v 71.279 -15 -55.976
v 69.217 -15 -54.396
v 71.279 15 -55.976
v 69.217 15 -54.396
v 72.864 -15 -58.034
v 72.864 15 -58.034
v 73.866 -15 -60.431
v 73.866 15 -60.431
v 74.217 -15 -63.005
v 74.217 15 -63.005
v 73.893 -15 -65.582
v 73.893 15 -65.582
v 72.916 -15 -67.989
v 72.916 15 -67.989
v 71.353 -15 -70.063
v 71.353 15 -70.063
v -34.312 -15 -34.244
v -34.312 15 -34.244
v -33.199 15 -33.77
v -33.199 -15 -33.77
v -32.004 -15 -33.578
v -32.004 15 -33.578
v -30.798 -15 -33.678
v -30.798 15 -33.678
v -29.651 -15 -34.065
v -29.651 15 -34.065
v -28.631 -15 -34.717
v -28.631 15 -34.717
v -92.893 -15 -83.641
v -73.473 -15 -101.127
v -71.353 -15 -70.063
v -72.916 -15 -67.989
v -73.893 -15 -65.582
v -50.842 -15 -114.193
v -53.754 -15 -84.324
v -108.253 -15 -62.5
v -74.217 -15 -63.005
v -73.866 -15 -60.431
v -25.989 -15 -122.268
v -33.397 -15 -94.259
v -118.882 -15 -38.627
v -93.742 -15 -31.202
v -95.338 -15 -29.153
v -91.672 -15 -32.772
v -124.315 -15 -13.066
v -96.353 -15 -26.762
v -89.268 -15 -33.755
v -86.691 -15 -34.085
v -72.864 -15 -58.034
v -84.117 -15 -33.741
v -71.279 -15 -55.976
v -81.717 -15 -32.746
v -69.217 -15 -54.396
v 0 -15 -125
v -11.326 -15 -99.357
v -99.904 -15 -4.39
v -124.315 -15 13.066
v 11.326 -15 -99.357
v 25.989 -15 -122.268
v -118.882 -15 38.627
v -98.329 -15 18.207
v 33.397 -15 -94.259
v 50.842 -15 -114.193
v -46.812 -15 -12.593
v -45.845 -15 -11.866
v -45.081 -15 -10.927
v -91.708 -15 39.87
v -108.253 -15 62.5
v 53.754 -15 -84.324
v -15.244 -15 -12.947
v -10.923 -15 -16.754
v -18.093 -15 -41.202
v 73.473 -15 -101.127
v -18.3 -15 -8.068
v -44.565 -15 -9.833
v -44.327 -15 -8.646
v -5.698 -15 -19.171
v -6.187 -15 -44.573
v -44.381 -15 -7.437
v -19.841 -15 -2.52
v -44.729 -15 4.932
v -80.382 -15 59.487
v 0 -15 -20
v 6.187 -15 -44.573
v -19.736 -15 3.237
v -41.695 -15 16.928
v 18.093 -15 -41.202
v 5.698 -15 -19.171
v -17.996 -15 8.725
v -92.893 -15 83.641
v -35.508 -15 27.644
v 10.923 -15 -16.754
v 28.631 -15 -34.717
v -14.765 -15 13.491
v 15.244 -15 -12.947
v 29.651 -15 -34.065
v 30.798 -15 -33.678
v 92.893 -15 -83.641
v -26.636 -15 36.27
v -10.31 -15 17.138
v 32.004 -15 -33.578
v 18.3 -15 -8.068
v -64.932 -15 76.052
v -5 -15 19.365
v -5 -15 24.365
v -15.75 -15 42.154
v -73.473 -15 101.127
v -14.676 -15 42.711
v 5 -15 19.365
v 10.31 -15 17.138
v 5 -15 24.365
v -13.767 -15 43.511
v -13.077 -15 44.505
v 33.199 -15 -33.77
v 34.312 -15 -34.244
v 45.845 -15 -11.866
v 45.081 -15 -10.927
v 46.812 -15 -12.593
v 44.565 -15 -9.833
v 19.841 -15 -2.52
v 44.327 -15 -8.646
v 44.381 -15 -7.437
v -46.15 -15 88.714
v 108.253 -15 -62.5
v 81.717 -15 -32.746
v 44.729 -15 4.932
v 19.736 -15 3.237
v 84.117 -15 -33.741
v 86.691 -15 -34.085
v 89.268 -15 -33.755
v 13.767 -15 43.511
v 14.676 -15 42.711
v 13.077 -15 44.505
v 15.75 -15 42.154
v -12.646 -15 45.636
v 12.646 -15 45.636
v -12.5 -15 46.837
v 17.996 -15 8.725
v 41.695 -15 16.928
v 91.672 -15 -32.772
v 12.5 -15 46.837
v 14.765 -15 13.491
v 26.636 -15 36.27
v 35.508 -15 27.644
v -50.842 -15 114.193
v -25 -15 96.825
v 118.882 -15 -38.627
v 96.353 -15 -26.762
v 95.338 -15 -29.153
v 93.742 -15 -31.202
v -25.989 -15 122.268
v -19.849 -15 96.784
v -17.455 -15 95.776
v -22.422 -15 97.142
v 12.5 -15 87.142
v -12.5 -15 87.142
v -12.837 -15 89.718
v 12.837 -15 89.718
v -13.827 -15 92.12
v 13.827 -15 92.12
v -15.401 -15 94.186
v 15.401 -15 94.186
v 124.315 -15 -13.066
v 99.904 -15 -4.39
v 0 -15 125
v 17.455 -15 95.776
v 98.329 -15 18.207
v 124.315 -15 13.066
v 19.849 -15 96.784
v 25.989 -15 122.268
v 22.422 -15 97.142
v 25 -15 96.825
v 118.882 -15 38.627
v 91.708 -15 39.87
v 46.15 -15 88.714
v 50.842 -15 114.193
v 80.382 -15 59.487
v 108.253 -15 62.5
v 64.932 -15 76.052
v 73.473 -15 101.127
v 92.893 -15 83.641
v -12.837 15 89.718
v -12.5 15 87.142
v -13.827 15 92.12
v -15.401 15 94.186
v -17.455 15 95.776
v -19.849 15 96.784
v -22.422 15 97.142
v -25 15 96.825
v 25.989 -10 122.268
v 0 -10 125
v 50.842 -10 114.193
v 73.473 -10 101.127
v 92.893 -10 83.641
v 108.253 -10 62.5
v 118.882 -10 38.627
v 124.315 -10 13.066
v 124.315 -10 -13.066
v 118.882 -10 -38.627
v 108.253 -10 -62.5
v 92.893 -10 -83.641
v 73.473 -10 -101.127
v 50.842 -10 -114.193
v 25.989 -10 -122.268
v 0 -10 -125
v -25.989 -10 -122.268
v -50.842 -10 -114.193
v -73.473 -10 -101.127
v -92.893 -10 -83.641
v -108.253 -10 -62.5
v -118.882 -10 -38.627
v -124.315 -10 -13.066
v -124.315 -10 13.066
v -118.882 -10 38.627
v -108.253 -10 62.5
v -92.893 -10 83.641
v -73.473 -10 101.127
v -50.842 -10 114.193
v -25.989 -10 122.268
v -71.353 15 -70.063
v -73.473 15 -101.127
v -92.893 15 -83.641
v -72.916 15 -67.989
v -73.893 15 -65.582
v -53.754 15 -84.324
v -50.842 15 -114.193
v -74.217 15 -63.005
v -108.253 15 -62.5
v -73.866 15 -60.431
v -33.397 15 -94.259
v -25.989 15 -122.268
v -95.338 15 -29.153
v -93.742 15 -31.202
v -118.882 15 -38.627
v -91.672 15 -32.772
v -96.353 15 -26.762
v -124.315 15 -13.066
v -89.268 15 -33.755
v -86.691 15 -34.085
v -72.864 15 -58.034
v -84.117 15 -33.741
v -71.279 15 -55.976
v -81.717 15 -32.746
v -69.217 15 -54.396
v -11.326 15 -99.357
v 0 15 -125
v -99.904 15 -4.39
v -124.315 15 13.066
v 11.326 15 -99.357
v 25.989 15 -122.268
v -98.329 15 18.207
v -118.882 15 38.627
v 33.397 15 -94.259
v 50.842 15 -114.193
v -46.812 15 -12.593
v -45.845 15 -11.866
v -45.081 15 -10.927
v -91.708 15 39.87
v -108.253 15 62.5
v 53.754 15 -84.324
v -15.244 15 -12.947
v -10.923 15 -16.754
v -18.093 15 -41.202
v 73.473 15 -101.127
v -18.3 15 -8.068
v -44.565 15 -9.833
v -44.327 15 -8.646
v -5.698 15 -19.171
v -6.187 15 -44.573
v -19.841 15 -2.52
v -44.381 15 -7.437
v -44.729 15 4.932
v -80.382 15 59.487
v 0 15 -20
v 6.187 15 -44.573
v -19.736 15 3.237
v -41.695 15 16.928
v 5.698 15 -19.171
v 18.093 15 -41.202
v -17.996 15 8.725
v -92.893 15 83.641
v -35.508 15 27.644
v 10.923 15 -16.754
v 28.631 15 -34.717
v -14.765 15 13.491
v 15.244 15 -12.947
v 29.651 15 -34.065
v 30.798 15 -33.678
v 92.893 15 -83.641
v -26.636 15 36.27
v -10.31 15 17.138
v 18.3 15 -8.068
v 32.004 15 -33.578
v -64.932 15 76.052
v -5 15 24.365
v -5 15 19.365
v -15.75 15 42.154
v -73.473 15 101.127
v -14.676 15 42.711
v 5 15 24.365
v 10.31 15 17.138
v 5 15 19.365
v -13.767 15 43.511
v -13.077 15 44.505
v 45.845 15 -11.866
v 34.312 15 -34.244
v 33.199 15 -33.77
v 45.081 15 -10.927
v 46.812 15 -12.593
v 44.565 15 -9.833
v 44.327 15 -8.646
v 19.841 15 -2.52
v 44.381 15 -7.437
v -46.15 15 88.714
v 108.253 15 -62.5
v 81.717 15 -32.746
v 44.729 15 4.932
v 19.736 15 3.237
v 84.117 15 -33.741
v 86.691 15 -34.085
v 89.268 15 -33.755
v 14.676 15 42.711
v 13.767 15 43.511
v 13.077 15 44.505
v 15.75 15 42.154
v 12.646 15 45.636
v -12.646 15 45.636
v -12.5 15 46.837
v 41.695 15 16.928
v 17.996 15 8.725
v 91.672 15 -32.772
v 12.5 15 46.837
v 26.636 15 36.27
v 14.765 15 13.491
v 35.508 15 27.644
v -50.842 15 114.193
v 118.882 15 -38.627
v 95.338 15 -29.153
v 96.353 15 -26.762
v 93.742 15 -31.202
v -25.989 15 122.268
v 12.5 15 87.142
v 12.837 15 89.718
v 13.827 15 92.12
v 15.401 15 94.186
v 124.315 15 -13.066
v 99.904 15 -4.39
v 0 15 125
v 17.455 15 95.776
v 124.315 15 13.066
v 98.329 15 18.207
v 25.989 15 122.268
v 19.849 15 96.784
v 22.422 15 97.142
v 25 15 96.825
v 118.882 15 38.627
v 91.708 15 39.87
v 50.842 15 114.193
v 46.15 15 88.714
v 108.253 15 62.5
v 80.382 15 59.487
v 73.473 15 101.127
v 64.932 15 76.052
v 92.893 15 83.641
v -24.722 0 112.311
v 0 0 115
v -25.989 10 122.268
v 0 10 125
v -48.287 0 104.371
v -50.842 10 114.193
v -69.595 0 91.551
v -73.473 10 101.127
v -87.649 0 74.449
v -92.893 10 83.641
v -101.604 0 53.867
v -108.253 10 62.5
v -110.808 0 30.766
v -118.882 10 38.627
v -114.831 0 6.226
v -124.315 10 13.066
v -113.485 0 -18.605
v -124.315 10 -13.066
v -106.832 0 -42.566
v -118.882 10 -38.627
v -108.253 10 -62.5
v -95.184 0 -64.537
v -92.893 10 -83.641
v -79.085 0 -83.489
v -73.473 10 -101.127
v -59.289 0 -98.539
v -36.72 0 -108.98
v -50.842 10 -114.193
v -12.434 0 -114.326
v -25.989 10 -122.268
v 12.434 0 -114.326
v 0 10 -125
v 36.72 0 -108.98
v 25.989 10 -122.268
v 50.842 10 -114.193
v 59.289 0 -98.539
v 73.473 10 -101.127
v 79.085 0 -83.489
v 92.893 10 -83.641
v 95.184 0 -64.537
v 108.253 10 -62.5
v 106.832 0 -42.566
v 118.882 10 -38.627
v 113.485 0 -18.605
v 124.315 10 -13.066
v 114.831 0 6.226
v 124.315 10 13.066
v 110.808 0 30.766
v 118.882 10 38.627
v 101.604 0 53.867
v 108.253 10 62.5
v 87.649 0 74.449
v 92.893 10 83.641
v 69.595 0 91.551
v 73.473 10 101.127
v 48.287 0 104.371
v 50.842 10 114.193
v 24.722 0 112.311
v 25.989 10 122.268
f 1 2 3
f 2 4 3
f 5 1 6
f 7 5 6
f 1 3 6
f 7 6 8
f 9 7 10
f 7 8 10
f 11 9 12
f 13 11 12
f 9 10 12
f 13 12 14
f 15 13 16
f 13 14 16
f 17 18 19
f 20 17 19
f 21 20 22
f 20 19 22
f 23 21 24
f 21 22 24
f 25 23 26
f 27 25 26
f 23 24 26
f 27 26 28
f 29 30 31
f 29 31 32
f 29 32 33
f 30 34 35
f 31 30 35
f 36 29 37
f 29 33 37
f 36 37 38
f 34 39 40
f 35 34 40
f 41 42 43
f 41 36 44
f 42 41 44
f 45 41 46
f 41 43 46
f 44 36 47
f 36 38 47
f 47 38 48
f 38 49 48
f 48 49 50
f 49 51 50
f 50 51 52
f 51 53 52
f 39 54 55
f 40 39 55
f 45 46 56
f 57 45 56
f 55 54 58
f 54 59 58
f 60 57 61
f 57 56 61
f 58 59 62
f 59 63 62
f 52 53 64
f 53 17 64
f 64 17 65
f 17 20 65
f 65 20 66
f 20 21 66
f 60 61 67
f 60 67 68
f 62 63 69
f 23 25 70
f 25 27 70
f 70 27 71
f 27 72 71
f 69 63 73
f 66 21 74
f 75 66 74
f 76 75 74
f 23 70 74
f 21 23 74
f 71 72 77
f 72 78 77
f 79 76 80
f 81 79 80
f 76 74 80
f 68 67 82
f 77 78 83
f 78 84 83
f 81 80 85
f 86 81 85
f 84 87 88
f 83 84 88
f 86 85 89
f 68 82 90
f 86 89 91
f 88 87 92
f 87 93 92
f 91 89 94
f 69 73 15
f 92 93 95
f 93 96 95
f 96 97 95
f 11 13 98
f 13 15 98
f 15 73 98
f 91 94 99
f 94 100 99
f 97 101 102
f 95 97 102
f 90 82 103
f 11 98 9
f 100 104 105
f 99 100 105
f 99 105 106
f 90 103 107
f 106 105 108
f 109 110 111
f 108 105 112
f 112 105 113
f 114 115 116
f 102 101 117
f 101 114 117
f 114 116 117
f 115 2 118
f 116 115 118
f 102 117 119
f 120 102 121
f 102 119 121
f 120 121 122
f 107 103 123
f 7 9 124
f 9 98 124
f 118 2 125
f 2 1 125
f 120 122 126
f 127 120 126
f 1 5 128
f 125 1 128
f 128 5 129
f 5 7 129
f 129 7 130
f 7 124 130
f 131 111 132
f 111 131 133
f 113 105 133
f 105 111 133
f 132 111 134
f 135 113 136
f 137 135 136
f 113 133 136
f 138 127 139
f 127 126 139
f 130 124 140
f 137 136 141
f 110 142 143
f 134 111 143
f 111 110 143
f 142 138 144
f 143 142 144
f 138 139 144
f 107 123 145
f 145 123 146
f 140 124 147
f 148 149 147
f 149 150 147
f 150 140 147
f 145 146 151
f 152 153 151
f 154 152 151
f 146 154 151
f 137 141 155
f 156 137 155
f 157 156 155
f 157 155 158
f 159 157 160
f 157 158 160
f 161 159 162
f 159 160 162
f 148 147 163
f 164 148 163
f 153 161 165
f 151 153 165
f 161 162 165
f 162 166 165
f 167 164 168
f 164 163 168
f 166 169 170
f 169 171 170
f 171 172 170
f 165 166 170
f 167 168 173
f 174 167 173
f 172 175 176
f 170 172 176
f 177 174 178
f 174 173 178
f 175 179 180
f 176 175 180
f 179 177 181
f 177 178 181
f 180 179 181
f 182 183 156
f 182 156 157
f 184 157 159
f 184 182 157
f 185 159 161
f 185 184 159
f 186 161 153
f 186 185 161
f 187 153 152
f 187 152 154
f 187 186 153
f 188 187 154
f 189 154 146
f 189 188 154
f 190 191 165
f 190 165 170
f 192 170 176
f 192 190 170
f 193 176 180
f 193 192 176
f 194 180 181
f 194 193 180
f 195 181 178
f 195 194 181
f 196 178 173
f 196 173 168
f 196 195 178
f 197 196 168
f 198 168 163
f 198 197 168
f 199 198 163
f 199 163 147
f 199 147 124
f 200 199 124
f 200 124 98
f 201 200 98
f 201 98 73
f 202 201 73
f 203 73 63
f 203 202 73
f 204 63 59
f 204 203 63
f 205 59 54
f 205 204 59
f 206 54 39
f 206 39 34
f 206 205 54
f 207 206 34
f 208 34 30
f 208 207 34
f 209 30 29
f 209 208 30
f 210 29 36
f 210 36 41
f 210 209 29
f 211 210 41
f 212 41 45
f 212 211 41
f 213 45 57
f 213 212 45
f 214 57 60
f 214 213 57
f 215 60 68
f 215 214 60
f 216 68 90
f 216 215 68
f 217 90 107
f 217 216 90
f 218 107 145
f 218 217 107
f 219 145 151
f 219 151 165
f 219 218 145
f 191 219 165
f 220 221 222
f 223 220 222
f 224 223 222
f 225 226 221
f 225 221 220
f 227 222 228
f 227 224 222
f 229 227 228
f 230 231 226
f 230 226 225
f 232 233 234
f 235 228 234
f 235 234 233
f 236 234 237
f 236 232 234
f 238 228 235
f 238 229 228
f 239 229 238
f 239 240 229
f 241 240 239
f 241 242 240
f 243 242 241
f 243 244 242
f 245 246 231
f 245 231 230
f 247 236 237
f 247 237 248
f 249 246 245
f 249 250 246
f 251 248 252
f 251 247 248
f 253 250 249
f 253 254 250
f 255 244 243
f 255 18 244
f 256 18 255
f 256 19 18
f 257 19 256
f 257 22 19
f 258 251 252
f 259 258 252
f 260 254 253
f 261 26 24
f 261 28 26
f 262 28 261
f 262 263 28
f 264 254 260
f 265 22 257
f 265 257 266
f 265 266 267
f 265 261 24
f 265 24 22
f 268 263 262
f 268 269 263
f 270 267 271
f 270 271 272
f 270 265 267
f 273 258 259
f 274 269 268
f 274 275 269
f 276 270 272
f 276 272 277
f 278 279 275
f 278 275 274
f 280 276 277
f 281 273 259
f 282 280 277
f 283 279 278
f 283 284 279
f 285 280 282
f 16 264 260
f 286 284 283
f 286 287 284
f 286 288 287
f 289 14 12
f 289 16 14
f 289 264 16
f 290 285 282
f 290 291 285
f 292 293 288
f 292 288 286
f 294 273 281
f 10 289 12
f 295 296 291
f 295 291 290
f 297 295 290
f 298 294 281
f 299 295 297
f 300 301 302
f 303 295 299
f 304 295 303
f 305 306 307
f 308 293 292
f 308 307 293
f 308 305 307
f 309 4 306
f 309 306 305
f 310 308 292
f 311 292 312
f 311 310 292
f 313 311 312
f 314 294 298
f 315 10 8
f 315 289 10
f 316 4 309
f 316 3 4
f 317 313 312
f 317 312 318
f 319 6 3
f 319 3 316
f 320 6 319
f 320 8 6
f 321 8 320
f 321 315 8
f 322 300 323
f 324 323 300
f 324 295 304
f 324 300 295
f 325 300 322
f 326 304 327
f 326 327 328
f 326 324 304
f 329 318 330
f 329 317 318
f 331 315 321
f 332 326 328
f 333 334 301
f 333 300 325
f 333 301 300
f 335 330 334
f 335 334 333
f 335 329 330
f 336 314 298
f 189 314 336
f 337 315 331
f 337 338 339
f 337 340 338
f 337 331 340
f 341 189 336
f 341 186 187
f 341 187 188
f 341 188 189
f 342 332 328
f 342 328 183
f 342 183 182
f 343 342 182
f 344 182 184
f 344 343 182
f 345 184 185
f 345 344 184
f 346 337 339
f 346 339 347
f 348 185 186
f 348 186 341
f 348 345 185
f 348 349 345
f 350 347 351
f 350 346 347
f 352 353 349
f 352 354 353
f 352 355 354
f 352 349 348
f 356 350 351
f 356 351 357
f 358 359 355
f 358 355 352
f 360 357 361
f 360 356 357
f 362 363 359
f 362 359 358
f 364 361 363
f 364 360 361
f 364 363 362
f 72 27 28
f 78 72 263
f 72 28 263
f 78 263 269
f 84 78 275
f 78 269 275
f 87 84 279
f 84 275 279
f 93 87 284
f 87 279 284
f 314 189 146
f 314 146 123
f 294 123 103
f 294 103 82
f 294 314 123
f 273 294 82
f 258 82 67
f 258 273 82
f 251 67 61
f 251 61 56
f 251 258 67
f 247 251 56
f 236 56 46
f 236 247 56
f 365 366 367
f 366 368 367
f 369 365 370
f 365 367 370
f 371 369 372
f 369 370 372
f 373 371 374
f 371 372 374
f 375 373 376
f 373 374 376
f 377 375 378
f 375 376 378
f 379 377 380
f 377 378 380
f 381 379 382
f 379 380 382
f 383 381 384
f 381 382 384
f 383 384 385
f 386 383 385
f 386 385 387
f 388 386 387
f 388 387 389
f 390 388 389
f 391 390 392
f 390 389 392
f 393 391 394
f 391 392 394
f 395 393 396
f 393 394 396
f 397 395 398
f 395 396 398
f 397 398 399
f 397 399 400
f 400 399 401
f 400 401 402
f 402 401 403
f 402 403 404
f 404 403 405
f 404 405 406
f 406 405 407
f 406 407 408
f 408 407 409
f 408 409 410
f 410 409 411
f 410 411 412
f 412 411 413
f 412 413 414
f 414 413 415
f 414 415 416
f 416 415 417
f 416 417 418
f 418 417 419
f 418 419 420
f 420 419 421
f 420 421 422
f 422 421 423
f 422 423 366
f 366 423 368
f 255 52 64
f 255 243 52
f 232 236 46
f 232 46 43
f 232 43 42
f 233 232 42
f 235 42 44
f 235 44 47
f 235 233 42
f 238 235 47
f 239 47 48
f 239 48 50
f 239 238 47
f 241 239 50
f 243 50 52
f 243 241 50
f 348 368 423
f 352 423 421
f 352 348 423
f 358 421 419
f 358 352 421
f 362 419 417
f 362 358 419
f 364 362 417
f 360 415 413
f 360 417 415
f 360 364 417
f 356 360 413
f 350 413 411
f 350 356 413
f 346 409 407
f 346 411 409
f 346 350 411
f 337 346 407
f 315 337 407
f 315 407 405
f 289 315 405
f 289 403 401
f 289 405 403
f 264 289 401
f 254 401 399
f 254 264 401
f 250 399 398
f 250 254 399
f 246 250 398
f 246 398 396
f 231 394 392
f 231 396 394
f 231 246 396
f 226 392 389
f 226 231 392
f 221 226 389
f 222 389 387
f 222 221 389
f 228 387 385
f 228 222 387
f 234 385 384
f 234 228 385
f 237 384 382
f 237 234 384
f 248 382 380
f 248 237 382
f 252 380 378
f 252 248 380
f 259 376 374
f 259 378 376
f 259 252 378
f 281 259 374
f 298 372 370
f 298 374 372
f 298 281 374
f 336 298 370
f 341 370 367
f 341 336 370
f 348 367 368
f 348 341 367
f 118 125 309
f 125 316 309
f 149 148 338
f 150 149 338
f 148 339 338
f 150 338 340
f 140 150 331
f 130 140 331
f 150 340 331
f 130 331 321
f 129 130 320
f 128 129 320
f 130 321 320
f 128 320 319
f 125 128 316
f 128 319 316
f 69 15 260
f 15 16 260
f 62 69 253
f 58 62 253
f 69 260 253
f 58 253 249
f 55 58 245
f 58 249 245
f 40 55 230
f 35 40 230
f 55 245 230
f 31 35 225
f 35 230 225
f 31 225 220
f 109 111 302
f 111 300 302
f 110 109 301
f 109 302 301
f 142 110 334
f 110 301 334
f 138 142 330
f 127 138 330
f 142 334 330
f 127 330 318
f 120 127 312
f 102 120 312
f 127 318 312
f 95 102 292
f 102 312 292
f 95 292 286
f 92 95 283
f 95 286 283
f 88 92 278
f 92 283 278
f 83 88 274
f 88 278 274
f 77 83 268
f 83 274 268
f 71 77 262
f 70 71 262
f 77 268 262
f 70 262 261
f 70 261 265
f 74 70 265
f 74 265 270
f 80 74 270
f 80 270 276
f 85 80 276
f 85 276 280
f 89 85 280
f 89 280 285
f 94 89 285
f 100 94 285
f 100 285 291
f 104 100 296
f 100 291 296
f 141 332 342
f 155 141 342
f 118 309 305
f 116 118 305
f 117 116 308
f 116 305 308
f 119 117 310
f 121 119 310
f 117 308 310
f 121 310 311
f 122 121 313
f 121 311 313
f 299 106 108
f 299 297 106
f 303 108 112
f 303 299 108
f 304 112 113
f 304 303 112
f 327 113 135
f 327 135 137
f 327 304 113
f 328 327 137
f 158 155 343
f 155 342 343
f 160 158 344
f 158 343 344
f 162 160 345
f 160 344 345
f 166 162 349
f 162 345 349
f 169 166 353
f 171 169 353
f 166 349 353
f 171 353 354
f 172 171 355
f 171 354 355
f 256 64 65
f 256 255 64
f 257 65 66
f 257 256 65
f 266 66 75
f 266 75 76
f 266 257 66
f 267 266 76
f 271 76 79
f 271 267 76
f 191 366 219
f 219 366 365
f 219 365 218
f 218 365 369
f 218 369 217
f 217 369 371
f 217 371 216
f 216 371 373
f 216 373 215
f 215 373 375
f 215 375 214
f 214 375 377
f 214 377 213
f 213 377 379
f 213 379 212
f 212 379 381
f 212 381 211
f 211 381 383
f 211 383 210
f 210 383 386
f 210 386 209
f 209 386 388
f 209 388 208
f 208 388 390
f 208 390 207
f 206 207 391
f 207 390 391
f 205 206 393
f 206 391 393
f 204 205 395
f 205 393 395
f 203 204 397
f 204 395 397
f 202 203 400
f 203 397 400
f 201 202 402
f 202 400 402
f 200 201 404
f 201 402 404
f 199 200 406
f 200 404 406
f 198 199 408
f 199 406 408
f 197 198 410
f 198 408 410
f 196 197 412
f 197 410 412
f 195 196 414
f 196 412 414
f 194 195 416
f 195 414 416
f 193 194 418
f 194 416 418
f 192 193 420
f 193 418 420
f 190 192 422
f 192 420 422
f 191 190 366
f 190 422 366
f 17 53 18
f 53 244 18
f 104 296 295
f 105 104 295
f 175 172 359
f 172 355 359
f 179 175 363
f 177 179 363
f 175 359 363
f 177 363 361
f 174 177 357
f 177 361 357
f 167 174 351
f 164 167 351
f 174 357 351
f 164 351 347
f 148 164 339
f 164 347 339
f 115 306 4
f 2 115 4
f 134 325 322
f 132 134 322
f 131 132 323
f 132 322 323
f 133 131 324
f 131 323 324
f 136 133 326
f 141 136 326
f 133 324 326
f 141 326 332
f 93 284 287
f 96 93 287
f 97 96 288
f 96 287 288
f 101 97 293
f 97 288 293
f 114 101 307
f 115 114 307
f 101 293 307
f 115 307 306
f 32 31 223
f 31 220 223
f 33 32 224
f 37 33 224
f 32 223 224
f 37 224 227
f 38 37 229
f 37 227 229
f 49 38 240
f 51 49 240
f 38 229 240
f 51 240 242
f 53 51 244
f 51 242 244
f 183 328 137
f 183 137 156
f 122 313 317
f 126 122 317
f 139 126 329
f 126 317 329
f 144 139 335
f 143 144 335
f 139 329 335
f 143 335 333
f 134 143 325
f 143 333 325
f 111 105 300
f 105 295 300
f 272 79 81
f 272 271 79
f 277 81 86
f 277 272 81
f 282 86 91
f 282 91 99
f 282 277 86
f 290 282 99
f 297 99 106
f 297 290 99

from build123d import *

# Parameters (mm, degrees)
SKETCH1_R           = 125
BOSS_EXTRUDE1_DEPTH = 15


with BuildPart() as part:
    # Sketch1 → Boss-Extrude1 (new, symmetric)
    with BuildSketch(Plane(origin=(0, 0, 0), x_dir=(1, 0, 0), z_dir=(0, 1, 0))):
        with Locations(Location((0, 0, 0), (0, 0, 270))):
            Circle(SKETCH1_R)
        with BuildLine():
            Line((34.312451849, 34.244060041), (69.217294241, 54.396380192))
            ThreePointArc((69.217294241, 54.396380192), (74.125688388, 61.706180446), (71.352549156, 70.062926922))
            ThreePointArc((71.352549156, 70.062926922), (0, 100), (-71.352549156, 70.062926922))
            ThreePointArc((-71.352549156, 70.062926922), (-74.125688388, 61.706180446), (-69.217294241, 54.396380192))
            Line((-69.217294241, 54.396380192), (-34.312451849, 34.244060041))
            ThreePointArc((-34.312451849, 34.244060041), (-31.397859232, 33.591405411), (-28.631206664, 34.716768354))
            ThreePointArc((-28.631206664, 34.716768354), (0, 45), (28.631206664, 34.716768354))
            ThreePointArc((28.631206664, 34.716768354), (31.397859232, 33.591405411), (34.312451849, 34.244060041))
        make_face(mode=Mode.SUBTRACT)
        with BuildLine():
            Line((-12.5, -46.837484988), (-12.5, -87.14212529))
            ThreePointArc((-12.5, -87.14212529), (-16.376275643, -95.04781944), (-25, -96.824583655))
            ThreePointArc((-25, -96.824583655), (-86.602540378, -50), (-96.352549156, 26.761656733))
            ThreePointArc((-96.352549156, 26.761656733), (-90.501964031, 33.341638994), (-81.717294241, 32.745745098))
            Line((-81.717294241, 32.745745098), (-46.812451849, 12.593424947))
            ThreePointArc((-46.812451849, 12.593424947), (-44.789940051, 10.395641014), (-44.381206664, 7.436968135))
            ThreePointArc((-44.381206664, 7.436968135), (-38.97114317, -22.5), (-15.75, -42.153736489))
            ThreePointArc((-15.75, -42.153736489), (-13.392080819, -43.987046425), (-12.5, -46.837484988))
        make_face(mode=Mode.SUBTRACT)
        with BuildLine():
            Line((12.5, -46.837484988), (12.5, -87.14212529))
            ThreePointArc((12.5, -87.14212529), (16.376275643, -95.04781944), (25, -96.824583655))
            ThreePointArc((25, -96.824583655), (86.602540378, -50), (96.352549156, 26.761656733))
            ThreePointArc((96.352549156, 26.761656733), (90.501964031, 33.341638994), (81.717294241, 32.745745098))
            Line((81.717294241, 32.745745098), (46.812451849, 12.593424947))
            ThreePointArc((46.812451849, 12.593424947), (44.789940051, 10.395641014), (44.381206664, 7.436968135))
            ThreePointArc((44.381206664, 7.436968135), (38.97114317, -22.5), (15.75, -42.153736489))
            ThreePointArc((15.75, -42.153736489), (13.392080819, -43.987046425), (12.5, -46.837484988))
        make_face(mode=Mode.SUBTRACT)
        with BuildLine():
            Line((-5, -19.364916731), (-5, -24.364916731))
            Line((-5, -24.364916731), (5, -24.364916731))
            Line((5, -24.364916731), (5, -19.364916731))
            ThreePointArc((5, -19.364916731), (0, 20), (-5, -19.364916731))
        make_face(mode=Mode.SUBTRACT)
    extrude(amount=BOSS_EXTRUDE1_DEPTH, both=True)

    # Sketch2 → Cut-Revolve1 (revolve, cut)
    with BuildSketch(Plane.XY, mode=Mode.PRIVATE) as cut_revolve1_sk:
        Polygon((-125, 10), (-125, -10), (-115, 0), align=None)
    revolve(cut_revolve1_sk.sketch.rotate(Axis((0, 35.426669207, 0), (0, -1, 0)), 270), axis=Axis((0, 35.426669207, 0), (0, -1, 0)), mode=Mode.SUBTRACT)


solid = part.part
